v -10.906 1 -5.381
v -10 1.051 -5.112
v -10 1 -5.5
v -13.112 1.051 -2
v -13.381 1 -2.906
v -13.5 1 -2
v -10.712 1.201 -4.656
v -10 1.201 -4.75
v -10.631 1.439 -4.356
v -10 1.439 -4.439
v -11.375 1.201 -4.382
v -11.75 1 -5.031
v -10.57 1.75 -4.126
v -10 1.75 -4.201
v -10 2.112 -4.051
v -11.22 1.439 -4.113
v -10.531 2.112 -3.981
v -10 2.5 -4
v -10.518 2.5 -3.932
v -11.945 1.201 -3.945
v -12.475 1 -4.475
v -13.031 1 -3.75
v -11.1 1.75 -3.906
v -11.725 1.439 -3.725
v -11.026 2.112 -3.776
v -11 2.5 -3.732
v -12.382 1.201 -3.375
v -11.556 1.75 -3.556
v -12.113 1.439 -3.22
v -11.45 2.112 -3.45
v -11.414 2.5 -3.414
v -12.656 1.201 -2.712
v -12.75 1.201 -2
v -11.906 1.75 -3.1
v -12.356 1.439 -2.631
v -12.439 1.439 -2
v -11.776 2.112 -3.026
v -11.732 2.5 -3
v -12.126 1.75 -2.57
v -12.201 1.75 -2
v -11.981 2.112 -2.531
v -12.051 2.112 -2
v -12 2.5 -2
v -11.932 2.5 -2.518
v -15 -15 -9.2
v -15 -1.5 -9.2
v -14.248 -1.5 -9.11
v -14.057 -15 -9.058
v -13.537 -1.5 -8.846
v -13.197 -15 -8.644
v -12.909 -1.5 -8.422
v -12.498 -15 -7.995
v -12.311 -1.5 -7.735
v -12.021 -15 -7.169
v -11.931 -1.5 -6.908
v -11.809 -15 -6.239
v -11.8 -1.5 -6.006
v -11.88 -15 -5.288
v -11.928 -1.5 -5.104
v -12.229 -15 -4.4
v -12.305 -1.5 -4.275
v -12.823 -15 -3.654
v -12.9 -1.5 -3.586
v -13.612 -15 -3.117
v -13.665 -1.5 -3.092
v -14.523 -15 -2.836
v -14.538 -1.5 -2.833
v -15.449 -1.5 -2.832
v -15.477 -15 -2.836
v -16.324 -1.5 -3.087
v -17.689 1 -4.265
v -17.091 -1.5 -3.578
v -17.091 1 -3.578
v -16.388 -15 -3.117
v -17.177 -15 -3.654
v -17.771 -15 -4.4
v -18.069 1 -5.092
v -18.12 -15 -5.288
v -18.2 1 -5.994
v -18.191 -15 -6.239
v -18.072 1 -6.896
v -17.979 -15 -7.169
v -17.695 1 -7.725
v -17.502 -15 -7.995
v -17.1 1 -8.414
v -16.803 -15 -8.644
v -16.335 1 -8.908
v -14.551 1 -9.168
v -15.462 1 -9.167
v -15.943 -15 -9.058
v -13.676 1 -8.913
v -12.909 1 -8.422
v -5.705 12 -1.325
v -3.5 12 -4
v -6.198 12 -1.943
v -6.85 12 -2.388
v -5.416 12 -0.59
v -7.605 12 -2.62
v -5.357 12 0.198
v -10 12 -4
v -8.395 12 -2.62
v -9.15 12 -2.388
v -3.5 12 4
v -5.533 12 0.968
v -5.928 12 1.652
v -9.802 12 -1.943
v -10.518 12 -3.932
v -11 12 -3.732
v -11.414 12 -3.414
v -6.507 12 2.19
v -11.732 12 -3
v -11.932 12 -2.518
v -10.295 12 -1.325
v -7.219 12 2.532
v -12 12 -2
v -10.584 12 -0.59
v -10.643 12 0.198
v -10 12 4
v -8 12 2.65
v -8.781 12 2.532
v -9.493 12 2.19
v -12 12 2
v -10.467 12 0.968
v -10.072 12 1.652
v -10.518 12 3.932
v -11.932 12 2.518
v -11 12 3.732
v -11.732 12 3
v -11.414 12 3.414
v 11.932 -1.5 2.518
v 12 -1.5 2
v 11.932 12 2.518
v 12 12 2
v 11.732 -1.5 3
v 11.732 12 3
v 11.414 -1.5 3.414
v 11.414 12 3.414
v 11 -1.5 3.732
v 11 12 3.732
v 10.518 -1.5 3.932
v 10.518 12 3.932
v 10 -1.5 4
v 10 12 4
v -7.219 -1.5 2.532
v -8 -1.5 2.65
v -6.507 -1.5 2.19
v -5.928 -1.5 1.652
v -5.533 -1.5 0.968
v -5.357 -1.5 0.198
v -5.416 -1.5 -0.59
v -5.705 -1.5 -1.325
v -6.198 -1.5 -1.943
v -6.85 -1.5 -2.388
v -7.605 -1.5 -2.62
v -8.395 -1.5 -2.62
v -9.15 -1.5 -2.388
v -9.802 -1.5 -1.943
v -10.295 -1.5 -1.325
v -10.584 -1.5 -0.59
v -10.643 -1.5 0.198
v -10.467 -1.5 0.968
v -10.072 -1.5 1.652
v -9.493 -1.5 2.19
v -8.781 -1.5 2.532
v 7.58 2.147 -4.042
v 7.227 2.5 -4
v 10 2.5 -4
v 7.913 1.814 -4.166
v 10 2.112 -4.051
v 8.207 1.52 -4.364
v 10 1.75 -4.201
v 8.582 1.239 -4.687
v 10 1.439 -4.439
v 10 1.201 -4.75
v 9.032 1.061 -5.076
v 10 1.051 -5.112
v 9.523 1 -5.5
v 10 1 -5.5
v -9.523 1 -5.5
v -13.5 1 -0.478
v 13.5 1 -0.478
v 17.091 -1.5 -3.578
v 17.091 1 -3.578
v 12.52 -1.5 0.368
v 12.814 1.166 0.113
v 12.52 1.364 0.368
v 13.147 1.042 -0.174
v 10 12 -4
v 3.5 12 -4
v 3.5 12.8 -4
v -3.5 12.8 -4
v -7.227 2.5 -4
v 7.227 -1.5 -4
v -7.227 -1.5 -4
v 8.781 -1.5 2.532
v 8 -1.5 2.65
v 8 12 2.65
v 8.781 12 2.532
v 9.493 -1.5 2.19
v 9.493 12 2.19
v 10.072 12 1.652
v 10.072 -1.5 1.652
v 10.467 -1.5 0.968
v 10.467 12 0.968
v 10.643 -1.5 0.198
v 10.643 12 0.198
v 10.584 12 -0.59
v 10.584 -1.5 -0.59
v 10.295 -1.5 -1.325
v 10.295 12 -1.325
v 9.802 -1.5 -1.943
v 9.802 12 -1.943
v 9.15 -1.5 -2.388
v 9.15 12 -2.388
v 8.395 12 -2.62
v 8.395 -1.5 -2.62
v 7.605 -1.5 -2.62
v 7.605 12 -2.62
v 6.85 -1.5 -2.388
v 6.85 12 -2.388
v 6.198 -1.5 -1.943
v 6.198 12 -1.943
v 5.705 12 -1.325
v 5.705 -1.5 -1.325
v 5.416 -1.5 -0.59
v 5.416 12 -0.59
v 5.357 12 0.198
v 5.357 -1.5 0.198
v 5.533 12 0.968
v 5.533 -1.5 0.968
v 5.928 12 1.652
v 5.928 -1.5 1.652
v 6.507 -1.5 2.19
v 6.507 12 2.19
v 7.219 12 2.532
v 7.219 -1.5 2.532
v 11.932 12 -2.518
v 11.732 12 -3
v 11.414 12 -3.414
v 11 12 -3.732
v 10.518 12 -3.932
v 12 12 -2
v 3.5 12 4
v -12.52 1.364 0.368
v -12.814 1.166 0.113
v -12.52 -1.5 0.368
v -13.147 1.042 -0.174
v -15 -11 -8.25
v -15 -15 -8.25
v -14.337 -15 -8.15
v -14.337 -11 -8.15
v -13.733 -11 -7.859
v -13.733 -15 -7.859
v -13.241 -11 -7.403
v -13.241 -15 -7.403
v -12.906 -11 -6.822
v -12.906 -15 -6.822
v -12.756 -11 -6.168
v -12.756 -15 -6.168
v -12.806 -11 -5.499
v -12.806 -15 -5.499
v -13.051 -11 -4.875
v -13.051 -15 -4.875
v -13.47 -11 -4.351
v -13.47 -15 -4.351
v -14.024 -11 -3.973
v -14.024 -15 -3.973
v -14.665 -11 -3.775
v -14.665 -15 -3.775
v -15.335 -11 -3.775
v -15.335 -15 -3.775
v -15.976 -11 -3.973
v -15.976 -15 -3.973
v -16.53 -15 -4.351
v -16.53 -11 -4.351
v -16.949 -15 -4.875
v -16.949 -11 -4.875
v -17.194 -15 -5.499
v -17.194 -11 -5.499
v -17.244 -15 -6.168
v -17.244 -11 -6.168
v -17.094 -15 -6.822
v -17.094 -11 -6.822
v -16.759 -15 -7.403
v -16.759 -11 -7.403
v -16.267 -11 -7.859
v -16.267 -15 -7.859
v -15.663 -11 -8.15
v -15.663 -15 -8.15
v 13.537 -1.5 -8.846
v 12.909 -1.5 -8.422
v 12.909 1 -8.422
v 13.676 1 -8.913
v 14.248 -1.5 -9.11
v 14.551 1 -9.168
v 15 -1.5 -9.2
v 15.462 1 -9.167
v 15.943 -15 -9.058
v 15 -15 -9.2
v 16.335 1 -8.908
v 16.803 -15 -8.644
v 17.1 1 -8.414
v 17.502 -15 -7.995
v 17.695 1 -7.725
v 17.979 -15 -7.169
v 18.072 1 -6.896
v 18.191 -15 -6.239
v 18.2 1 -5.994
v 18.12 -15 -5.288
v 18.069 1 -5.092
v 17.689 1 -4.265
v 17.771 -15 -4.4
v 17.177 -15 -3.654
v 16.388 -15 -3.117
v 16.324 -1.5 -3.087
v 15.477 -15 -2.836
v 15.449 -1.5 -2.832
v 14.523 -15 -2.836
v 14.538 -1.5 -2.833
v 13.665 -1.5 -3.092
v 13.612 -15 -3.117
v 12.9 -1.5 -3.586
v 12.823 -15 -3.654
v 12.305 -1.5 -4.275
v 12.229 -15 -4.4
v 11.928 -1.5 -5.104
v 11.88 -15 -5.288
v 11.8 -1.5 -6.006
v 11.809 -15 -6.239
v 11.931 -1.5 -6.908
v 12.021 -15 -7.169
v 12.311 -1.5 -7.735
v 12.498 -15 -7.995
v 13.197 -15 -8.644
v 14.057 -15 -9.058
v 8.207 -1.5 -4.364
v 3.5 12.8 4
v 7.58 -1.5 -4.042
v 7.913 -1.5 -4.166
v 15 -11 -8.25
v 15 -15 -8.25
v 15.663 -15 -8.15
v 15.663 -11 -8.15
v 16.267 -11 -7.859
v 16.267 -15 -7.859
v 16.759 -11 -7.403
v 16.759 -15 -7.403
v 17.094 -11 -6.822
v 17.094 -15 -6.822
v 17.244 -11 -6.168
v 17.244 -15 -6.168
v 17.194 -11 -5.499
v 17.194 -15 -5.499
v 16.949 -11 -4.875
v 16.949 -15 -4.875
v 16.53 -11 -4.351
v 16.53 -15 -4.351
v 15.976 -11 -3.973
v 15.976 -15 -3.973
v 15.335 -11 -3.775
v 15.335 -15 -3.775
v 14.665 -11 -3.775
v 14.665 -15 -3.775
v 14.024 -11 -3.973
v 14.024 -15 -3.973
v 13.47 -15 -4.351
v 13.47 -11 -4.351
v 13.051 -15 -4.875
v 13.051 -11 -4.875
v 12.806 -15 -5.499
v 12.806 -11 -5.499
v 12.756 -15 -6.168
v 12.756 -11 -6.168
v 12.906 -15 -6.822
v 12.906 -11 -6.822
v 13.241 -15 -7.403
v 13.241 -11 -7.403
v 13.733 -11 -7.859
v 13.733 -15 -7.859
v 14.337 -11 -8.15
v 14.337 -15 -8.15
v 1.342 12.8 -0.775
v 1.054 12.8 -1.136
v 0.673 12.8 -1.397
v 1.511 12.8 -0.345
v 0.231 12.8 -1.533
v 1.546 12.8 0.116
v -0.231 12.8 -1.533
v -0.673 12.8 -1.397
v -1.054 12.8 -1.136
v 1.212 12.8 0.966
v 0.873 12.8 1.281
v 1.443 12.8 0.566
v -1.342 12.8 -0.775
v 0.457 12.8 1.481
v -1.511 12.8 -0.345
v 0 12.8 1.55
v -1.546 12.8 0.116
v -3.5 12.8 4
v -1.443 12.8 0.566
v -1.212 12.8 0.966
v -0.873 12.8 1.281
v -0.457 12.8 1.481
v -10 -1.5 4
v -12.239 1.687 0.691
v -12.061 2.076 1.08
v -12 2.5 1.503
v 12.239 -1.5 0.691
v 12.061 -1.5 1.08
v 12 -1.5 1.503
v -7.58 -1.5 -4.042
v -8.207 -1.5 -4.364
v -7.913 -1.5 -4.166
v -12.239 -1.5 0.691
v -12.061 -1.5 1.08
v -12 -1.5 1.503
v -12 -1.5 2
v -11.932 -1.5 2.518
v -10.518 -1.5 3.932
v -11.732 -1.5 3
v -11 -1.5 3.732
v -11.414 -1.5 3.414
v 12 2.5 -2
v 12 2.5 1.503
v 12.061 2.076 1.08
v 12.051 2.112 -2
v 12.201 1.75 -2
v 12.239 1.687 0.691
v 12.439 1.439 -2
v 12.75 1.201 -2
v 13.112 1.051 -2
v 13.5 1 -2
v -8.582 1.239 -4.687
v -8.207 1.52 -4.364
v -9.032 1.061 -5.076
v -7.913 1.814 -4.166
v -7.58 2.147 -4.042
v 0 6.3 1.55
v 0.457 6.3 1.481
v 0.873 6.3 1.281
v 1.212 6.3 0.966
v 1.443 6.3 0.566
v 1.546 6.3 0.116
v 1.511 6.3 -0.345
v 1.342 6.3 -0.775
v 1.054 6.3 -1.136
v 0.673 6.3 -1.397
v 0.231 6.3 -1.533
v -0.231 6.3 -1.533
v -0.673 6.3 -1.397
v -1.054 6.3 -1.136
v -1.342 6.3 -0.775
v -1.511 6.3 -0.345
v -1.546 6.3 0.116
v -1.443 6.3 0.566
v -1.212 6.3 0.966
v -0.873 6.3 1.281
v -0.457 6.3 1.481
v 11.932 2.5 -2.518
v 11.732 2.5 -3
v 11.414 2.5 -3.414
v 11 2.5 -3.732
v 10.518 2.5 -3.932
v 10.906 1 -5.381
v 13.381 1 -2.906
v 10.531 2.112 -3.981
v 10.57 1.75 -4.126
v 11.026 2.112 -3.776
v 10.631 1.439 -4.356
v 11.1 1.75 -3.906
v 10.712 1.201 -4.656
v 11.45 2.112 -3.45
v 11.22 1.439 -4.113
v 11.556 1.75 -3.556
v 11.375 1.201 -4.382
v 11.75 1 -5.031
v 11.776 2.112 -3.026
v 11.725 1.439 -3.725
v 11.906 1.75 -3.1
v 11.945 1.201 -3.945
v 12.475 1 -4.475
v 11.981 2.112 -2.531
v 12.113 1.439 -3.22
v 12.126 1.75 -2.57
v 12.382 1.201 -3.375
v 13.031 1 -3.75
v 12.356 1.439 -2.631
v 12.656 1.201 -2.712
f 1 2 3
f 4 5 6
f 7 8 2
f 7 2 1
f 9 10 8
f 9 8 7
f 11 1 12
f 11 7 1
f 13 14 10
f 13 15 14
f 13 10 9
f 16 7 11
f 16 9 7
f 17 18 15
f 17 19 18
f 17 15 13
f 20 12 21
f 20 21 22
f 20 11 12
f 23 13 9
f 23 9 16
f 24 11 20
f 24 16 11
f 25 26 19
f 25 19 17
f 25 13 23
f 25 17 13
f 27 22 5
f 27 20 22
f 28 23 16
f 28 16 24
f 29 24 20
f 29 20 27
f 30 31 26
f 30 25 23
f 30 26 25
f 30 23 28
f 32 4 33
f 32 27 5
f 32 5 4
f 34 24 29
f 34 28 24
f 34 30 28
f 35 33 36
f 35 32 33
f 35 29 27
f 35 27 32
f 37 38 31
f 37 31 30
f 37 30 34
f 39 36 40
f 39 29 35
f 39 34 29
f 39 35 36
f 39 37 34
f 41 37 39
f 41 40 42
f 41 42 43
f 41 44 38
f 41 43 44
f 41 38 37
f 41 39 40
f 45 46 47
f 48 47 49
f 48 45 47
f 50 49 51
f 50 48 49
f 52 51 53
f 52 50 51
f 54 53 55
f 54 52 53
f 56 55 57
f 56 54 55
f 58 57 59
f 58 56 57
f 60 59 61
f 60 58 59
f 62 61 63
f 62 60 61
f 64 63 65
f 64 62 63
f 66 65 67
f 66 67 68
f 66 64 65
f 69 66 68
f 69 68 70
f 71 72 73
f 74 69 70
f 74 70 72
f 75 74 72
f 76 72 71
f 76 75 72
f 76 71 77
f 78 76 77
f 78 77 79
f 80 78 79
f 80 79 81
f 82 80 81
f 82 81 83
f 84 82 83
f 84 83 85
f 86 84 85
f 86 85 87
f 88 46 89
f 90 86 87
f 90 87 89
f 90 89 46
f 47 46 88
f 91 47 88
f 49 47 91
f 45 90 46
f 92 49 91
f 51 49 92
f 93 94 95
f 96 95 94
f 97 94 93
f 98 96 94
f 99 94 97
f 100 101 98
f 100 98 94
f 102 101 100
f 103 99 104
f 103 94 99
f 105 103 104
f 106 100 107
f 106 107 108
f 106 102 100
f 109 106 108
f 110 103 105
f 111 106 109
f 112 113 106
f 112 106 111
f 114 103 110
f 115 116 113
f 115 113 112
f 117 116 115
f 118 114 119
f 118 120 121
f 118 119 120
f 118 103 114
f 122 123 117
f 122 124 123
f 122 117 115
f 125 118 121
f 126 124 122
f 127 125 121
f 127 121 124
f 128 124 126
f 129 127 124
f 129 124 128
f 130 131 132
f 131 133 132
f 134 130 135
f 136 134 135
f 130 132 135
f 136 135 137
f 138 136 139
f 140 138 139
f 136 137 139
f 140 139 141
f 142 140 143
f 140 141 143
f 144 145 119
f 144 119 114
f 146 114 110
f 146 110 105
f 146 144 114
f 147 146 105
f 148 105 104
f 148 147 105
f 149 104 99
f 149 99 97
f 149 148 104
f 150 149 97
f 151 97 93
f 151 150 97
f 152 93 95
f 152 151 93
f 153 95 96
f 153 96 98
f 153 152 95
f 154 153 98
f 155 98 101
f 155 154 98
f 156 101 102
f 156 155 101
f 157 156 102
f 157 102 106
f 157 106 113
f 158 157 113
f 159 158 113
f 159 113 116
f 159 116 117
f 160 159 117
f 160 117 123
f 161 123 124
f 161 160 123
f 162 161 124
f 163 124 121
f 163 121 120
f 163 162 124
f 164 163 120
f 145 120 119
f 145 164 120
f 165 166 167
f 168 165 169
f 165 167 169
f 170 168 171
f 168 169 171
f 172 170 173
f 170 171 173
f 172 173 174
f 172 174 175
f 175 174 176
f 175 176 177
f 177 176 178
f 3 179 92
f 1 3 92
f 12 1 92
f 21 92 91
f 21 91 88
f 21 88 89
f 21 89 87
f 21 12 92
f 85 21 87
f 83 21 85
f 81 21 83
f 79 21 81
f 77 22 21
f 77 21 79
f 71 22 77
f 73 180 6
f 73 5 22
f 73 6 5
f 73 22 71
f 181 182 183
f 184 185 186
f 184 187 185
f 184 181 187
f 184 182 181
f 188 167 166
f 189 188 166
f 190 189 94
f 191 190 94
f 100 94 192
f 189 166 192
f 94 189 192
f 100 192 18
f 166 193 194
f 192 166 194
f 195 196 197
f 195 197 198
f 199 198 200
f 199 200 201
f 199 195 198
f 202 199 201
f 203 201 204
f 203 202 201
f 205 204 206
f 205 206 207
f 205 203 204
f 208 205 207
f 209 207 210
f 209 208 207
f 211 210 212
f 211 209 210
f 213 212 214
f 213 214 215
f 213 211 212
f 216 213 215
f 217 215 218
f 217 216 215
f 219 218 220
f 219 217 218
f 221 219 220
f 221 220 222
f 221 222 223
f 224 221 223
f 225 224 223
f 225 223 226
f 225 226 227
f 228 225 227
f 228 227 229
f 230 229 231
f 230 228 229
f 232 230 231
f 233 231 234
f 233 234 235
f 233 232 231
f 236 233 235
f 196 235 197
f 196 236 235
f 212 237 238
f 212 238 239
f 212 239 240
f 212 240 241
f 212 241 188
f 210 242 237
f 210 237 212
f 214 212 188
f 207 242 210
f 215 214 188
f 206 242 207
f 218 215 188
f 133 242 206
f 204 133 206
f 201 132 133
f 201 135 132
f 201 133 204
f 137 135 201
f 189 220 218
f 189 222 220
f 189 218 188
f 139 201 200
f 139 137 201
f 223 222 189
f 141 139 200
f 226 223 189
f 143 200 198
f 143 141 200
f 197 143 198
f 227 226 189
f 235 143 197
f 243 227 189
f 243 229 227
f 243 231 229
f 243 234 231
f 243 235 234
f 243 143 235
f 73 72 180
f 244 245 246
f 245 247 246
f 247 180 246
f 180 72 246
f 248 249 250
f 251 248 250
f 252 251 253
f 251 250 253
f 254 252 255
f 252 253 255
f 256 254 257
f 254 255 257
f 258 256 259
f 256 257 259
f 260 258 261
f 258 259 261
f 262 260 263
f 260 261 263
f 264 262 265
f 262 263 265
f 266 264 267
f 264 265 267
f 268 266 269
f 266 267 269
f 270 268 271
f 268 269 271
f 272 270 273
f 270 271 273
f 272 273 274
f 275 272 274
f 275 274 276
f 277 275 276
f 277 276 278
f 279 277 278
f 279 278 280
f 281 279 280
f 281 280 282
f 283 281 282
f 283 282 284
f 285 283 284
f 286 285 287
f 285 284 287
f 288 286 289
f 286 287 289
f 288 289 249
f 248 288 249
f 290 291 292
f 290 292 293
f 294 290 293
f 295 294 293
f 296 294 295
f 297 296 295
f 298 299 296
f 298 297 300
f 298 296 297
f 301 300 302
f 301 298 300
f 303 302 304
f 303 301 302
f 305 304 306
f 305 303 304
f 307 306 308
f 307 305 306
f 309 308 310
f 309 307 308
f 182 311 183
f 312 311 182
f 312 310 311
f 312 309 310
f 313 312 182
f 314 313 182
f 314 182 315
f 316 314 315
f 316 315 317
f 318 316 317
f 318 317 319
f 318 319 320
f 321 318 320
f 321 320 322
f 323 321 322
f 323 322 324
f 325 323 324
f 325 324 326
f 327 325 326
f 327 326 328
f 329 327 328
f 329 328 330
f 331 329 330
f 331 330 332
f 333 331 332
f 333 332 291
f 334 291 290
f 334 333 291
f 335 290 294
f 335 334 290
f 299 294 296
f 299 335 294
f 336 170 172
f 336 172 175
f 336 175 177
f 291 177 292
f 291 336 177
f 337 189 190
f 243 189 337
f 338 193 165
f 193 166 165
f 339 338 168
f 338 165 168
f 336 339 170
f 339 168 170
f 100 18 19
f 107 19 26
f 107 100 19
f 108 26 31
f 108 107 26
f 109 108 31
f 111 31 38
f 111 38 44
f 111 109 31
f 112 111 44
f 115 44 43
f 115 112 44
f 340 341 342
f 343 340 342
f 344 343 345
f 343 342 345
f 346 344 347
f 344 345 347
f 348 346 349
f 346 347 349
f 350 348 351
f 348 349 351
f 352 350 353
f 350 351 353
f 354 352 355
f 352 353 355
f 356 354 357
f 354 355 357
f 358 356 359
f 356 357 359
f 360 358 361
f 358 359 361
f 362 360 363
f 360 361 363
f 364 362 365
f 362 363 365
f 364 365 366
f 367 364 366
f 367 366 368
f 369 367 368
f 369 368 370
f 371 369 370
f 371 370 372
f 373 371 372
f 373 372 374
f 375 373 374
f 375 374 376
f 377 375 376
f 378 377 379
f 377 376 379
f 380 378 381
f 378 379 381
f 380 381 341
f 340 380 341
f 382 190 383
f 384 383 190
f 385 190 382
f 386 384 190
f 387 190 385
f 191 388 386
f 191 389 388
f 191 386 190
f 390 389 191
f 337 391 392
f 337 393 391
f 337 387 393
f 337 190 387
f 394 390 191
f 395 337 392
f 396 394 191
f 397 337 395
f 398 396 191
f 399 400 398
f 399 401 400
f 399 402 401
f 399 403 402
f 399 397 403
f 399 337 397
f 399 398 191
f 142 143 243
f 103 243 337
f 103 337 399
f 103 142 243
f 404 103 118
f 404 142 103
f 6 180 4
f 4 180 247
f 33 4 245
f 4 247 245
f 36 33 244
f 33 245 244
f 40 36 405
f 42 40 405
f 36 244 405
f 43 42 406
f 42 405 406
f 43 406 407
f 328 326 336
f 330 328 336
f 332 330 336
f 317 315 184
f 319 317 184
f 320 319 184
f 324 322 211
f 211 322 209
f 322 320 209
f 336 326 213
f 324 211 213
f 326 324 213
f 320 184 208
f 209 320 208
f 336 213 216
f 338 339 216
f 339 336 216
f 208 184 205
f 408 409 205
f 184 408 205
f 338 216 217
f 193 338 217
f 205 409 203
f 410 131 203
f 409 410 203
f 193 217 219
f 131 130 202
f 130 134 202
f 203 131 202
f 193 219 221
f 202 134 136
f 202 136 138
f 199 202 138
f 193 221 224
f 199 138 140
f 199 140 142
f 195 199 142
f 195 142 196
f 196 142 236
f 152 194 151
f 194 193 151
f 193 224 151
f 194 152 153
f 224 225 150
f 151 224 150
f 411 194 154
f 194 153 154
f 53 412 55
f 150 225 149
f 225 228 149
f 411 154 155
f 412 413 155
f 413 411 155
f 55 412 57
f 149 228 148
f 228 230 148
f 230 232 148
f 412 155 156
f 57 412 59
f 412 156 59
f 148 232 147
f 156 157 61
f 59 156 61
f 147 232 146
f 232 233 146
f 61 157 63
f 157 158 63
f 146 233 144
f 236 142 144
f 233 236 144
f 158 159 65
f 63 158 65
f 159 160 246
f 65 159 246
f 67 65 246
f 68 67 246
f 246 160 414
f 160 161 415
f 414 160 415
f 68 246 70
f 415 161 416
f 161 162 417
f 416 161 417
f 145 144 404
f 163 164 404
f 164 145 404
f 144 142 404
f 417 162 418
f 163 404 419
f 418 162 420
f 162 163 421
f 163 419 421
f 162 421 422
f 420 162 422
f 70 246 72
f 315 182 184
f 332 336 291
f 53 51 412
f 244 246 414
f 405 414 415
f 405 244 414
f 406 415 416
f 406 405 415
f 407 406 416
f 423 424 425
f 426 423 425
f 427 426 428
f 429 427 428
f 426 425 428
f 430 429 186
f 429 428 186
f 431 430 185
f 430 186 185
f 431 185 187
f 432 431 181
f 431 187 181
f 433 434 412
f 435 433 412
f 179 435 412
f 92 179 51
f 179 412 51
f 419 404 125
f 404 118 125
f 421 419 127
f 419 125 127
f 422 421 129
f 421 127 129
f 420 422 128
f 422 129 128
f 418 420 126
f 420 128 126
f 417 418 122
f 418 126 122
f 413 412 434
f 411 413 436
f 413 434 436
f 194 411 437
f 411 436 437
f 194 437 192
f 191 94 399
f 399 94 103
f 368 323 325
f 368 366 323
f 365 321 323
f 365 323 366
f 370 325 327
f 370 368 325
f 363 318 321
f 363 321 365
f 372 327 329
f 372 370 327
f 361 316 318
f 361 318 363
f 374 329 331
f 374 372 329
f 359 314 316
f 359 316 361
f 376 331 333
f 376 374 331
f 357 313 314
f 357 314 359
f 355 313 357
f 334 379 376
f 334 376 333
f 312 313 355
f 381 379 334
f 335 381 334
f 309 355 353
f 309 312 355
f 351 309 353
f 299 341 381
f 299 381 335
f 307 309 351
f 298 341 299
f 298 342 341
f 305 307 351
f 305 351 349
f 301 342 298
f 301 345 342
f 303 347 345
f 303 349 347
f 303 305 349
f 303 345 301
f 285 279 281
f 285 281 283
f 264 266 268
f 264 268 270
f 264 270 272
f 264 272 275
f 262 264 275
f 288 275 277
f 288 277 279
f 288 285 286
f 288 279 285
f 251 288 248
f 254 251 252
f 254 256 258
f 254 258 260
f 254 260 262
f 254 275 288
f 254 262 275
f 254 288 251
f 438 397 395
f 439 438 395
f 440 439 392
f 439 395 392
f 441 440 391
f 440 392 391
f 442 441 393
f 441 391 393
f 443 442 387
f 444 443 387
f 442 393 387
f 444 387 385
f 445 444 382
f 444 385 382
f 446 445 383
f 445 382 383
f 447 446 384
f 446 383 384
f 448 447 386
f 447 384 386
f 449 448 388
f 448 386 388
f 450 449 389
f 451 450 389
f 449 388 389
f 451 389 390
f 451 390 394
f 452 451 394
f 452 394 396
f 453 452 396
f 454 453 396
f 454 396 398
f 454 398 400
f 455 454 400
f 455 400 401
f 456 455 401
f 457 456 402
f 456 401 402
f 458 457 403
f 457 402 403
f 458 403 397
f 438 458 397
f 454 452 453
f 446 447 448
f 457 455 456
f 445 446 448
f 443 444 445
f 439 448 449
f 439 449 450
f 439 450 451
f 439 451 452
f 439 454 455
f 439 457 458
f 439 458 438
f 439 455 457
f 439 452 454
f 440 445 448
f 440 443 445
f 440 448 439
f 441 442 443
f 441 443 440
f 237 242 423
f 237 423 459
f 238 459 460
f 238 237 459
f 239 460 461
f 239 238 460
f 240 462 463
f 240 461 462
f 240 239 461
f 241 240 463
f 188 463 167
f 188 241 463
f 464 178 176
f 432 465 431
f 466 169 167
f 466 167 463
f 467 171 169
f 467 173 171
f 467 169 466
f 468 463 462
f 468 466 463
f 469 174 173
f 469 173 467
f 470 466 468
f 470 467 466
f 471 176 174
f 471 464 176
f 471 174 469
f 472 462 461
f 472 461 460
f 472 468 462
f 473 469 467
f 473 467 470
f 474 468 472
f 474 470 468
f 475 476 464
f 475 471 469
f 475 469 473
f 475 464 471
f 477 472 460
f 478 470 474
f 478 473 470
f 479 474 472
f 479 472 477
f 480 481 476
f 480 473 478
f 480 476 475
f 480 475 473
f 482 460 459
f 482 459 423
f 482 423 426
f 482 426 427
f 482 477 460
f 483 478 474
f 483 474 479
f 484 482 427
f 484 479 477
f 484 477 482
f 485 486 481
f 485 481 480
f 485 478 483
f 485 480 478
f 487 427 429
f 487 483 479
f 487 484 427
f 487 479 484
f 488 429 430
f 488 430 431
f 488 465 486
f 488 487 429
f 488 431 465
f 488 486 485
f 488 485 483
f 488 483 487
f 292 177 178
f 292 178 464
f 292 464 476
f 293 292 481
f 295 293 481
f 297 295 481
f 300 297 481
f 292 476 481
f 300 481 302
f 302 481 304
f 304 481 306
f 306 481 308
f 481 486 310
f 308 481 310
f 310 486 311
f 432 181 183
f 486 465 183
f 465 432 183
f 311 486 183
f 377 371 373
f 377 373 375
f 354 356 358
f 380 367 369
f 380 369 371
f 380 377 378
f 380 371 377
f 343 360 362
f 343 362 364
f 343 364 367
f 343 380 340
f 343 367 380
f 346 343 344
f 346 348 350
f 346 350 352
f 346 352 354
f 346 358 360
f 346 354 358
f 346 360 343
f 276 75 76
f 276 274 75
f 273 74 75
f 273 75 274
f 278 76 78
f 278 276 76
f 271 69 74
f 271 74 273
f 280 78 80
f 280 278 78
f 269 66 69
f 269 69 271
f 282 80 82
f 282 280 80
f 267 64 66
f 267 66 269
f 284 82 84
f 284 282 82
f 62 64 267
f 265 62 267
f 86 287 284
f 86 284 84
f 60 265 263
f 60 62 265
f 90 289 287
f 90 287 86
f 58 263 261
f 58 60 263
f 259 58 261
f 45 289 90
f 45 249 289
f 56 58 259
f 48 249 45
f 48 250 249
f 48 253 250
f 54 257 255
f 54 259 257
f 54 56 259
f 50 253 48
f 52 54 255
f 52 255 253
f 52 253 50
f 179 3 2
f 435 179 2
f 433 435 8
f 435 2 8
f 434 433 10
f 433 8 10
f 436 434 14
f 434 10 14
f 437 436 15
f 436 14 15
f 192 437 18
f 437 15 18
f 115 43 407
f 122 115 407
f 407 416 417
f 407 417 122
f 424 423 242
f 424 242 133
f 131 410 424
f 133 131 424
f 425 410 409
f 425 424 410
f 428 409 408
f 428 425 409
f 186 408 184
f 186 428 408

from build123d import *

# Parameters (mm, degrees)
SKETCH25_W               = 7
SKETCH25_H               = 8
BOSS_EXTRUDE5_DEPTH      = 12.8
BOSS_EXTRUDE6_DEPTH      = 12
BOSS_EXTRUDE6_DEPTH_BACK = 1.5
SKETCH26_W               = 24
SKETCH26_H               = 8
SKETCH26_R               = 2.65
SKETCH27_R               = 1.55
CUT_EXTRUDE1_DEPTH       = 6.5
FILLET1_R                = 2
BOSS_EXTRUDE8_DEPTH      = 2.5
FILLET2_R                = 1.5
BOSS_EXTRUDE9_START      = 13.5
SKETCH30_R               = 3.2
BOSS_EXTRUDE9_DEPTH      = 13.5
SKETCH31_R               = 2.25
CUT_EXTRUDE2_DEPTH       = 4


with BuildPart() as part:
    # Sketch25 → Boss-Extrude5 (new body)
    with BuildSketch(Plane(origin=(0, 0, 0), x_dir=(-1, 0, 0), z_dir=(0, 1, 0))):
        Rectangle(SKETCH25_W, SKETCH25_H)
    extrude(amount=BOSS_EXTRUDE5_DEPTH)

    # Sketch26 → Boss-Extrude6 (add, two sides: drawn at the far end of the back side and taken through both)
    with BuildSketch(Plane(origin=(0, 0, 0), x_dir=(-1, 0, 0), z_dir=(0, 1, 0)).offset(-BOSS_EXTRUDE6_DEPTH_BACK)):
        Rectangle(SKETCH26_W, SKETCH26_H)
        with Locations((-8, 0)):
            Circle(SKETCH26_R, mode=Mode.SUBTRACT)
        with Locations((8, 0)):
            Circle(SKETCH26_R, mode=Mode.SUBTRACT)
    extrude(amount=BOSS_EXTRUDE6_DEPTH + BOSS_EXTRUDE6_DEPTH_BACK)

    # Sketch27 → Cut-Extrude1 (cut)
    with BuildSketch(Plane(origin=(0, 12.8, 0), x_dir=(1, 0, 0), z_dir=(0, 1, 0))):
        Circle(SKETCH27_R)
    extrude(amount=-CUT_EXTRUDE1_DEPTH, mode=Mode.SUBTRACT)

    # Fillet1
    fillet1_edges = [part.edges().sort_by_distance(p)[0] for p in [
        (-12, 5.25, 4),
        (12, 5.25, 4),
        (-12, 5.25, -4),
        (12, 5.25, -4),
    ]]
    fillet(fillet1_edges, radius=FILLET1_R)

    # Sketch29 → Boss-Extrude8 (add)
    with BuildSketch(Plane.XZ.offset(1.5)):
        with BuildLine():
            Line((-17.090822427, -3.57750922), (-12, 0.816317906))
            Line((-12, 0.816317906), (-10.745987583, -2.422706372))
            Line((-10.745987583, -2.422706372), (-7.78514456, -4))
            Line((-7.78514456, -4), (-12.909177573, -8.42249078))
            ThreePointArc((-12.909177573, -8.42249078), (-17.42249078, -8.090822427), (-17.090822427, -3.57750922))
        make_face()
        with BuildLine():
            Line((17.090822427, -3.57750922), (12, 0.816317906))
            Line((12, 0.816317906), (10.79122124, -2.606916283))
            Line((10.79122124, -2.606916283), (7.78514456, -4))
            Line((7.78514456, -4), (12.909177573, -8.42249078))
            ThreePointArc((12.909177573, -8.42249078), (17.42249078, -8.090822427), (17.090822427, -3.57750922))
        make_face()
    extrude(amount=-BOSS_EXTRUDE8_DEPTH)

    # Fillet2
    fillet2_edges = [part.edges().sort_by_distance(p)[0] for p in [
        (12, 1, -0.591841047),
        (11.414213562, 1, -3.414213562),
        (-8.89257228, 1, -4),
        (-11.414213562, 1, -3.414213562),
        (-12, -0.25, 0.816317906),
        (12, -0.25, 0.816317906),
        (-7.78514456, -0.25, -4),
        (7.78514456, -0.25, -4),
        (8.89257228, 1, -4),
        (-12, 1, -0.591841047),
    ]]
    fillet(fillet2_edges, radius=FILLET2_R)

    # Sketch30 → Boss-Extrude9 (add)
    with BuildSketch(Plane.XZ.offset(1.5).offset(BOSS_EXTRUDE9_START)):
        with Locations((-15, -6)):
            Circle(SKETCH30_R)
        with Locations((15, -6)):
            Circle(SKETCH30_R)
    extrude(amount=-BOSS_EXTRUDE9_DEPTH)

    # Sketch31 → Cut-Extrude2 (cut)
    with BuildSketch(Plane.XZ.offset(15)):
        with Locations((-15, -6)):
            Circle(SKETCH31_R)
        with Locations((15, -6)):
            Circle(SKETCH31_R)
    extrude(amount=-CUT_EXTRUDE2_DEPTH, mode=Mode.SUBTRACT)


solid = part.part
